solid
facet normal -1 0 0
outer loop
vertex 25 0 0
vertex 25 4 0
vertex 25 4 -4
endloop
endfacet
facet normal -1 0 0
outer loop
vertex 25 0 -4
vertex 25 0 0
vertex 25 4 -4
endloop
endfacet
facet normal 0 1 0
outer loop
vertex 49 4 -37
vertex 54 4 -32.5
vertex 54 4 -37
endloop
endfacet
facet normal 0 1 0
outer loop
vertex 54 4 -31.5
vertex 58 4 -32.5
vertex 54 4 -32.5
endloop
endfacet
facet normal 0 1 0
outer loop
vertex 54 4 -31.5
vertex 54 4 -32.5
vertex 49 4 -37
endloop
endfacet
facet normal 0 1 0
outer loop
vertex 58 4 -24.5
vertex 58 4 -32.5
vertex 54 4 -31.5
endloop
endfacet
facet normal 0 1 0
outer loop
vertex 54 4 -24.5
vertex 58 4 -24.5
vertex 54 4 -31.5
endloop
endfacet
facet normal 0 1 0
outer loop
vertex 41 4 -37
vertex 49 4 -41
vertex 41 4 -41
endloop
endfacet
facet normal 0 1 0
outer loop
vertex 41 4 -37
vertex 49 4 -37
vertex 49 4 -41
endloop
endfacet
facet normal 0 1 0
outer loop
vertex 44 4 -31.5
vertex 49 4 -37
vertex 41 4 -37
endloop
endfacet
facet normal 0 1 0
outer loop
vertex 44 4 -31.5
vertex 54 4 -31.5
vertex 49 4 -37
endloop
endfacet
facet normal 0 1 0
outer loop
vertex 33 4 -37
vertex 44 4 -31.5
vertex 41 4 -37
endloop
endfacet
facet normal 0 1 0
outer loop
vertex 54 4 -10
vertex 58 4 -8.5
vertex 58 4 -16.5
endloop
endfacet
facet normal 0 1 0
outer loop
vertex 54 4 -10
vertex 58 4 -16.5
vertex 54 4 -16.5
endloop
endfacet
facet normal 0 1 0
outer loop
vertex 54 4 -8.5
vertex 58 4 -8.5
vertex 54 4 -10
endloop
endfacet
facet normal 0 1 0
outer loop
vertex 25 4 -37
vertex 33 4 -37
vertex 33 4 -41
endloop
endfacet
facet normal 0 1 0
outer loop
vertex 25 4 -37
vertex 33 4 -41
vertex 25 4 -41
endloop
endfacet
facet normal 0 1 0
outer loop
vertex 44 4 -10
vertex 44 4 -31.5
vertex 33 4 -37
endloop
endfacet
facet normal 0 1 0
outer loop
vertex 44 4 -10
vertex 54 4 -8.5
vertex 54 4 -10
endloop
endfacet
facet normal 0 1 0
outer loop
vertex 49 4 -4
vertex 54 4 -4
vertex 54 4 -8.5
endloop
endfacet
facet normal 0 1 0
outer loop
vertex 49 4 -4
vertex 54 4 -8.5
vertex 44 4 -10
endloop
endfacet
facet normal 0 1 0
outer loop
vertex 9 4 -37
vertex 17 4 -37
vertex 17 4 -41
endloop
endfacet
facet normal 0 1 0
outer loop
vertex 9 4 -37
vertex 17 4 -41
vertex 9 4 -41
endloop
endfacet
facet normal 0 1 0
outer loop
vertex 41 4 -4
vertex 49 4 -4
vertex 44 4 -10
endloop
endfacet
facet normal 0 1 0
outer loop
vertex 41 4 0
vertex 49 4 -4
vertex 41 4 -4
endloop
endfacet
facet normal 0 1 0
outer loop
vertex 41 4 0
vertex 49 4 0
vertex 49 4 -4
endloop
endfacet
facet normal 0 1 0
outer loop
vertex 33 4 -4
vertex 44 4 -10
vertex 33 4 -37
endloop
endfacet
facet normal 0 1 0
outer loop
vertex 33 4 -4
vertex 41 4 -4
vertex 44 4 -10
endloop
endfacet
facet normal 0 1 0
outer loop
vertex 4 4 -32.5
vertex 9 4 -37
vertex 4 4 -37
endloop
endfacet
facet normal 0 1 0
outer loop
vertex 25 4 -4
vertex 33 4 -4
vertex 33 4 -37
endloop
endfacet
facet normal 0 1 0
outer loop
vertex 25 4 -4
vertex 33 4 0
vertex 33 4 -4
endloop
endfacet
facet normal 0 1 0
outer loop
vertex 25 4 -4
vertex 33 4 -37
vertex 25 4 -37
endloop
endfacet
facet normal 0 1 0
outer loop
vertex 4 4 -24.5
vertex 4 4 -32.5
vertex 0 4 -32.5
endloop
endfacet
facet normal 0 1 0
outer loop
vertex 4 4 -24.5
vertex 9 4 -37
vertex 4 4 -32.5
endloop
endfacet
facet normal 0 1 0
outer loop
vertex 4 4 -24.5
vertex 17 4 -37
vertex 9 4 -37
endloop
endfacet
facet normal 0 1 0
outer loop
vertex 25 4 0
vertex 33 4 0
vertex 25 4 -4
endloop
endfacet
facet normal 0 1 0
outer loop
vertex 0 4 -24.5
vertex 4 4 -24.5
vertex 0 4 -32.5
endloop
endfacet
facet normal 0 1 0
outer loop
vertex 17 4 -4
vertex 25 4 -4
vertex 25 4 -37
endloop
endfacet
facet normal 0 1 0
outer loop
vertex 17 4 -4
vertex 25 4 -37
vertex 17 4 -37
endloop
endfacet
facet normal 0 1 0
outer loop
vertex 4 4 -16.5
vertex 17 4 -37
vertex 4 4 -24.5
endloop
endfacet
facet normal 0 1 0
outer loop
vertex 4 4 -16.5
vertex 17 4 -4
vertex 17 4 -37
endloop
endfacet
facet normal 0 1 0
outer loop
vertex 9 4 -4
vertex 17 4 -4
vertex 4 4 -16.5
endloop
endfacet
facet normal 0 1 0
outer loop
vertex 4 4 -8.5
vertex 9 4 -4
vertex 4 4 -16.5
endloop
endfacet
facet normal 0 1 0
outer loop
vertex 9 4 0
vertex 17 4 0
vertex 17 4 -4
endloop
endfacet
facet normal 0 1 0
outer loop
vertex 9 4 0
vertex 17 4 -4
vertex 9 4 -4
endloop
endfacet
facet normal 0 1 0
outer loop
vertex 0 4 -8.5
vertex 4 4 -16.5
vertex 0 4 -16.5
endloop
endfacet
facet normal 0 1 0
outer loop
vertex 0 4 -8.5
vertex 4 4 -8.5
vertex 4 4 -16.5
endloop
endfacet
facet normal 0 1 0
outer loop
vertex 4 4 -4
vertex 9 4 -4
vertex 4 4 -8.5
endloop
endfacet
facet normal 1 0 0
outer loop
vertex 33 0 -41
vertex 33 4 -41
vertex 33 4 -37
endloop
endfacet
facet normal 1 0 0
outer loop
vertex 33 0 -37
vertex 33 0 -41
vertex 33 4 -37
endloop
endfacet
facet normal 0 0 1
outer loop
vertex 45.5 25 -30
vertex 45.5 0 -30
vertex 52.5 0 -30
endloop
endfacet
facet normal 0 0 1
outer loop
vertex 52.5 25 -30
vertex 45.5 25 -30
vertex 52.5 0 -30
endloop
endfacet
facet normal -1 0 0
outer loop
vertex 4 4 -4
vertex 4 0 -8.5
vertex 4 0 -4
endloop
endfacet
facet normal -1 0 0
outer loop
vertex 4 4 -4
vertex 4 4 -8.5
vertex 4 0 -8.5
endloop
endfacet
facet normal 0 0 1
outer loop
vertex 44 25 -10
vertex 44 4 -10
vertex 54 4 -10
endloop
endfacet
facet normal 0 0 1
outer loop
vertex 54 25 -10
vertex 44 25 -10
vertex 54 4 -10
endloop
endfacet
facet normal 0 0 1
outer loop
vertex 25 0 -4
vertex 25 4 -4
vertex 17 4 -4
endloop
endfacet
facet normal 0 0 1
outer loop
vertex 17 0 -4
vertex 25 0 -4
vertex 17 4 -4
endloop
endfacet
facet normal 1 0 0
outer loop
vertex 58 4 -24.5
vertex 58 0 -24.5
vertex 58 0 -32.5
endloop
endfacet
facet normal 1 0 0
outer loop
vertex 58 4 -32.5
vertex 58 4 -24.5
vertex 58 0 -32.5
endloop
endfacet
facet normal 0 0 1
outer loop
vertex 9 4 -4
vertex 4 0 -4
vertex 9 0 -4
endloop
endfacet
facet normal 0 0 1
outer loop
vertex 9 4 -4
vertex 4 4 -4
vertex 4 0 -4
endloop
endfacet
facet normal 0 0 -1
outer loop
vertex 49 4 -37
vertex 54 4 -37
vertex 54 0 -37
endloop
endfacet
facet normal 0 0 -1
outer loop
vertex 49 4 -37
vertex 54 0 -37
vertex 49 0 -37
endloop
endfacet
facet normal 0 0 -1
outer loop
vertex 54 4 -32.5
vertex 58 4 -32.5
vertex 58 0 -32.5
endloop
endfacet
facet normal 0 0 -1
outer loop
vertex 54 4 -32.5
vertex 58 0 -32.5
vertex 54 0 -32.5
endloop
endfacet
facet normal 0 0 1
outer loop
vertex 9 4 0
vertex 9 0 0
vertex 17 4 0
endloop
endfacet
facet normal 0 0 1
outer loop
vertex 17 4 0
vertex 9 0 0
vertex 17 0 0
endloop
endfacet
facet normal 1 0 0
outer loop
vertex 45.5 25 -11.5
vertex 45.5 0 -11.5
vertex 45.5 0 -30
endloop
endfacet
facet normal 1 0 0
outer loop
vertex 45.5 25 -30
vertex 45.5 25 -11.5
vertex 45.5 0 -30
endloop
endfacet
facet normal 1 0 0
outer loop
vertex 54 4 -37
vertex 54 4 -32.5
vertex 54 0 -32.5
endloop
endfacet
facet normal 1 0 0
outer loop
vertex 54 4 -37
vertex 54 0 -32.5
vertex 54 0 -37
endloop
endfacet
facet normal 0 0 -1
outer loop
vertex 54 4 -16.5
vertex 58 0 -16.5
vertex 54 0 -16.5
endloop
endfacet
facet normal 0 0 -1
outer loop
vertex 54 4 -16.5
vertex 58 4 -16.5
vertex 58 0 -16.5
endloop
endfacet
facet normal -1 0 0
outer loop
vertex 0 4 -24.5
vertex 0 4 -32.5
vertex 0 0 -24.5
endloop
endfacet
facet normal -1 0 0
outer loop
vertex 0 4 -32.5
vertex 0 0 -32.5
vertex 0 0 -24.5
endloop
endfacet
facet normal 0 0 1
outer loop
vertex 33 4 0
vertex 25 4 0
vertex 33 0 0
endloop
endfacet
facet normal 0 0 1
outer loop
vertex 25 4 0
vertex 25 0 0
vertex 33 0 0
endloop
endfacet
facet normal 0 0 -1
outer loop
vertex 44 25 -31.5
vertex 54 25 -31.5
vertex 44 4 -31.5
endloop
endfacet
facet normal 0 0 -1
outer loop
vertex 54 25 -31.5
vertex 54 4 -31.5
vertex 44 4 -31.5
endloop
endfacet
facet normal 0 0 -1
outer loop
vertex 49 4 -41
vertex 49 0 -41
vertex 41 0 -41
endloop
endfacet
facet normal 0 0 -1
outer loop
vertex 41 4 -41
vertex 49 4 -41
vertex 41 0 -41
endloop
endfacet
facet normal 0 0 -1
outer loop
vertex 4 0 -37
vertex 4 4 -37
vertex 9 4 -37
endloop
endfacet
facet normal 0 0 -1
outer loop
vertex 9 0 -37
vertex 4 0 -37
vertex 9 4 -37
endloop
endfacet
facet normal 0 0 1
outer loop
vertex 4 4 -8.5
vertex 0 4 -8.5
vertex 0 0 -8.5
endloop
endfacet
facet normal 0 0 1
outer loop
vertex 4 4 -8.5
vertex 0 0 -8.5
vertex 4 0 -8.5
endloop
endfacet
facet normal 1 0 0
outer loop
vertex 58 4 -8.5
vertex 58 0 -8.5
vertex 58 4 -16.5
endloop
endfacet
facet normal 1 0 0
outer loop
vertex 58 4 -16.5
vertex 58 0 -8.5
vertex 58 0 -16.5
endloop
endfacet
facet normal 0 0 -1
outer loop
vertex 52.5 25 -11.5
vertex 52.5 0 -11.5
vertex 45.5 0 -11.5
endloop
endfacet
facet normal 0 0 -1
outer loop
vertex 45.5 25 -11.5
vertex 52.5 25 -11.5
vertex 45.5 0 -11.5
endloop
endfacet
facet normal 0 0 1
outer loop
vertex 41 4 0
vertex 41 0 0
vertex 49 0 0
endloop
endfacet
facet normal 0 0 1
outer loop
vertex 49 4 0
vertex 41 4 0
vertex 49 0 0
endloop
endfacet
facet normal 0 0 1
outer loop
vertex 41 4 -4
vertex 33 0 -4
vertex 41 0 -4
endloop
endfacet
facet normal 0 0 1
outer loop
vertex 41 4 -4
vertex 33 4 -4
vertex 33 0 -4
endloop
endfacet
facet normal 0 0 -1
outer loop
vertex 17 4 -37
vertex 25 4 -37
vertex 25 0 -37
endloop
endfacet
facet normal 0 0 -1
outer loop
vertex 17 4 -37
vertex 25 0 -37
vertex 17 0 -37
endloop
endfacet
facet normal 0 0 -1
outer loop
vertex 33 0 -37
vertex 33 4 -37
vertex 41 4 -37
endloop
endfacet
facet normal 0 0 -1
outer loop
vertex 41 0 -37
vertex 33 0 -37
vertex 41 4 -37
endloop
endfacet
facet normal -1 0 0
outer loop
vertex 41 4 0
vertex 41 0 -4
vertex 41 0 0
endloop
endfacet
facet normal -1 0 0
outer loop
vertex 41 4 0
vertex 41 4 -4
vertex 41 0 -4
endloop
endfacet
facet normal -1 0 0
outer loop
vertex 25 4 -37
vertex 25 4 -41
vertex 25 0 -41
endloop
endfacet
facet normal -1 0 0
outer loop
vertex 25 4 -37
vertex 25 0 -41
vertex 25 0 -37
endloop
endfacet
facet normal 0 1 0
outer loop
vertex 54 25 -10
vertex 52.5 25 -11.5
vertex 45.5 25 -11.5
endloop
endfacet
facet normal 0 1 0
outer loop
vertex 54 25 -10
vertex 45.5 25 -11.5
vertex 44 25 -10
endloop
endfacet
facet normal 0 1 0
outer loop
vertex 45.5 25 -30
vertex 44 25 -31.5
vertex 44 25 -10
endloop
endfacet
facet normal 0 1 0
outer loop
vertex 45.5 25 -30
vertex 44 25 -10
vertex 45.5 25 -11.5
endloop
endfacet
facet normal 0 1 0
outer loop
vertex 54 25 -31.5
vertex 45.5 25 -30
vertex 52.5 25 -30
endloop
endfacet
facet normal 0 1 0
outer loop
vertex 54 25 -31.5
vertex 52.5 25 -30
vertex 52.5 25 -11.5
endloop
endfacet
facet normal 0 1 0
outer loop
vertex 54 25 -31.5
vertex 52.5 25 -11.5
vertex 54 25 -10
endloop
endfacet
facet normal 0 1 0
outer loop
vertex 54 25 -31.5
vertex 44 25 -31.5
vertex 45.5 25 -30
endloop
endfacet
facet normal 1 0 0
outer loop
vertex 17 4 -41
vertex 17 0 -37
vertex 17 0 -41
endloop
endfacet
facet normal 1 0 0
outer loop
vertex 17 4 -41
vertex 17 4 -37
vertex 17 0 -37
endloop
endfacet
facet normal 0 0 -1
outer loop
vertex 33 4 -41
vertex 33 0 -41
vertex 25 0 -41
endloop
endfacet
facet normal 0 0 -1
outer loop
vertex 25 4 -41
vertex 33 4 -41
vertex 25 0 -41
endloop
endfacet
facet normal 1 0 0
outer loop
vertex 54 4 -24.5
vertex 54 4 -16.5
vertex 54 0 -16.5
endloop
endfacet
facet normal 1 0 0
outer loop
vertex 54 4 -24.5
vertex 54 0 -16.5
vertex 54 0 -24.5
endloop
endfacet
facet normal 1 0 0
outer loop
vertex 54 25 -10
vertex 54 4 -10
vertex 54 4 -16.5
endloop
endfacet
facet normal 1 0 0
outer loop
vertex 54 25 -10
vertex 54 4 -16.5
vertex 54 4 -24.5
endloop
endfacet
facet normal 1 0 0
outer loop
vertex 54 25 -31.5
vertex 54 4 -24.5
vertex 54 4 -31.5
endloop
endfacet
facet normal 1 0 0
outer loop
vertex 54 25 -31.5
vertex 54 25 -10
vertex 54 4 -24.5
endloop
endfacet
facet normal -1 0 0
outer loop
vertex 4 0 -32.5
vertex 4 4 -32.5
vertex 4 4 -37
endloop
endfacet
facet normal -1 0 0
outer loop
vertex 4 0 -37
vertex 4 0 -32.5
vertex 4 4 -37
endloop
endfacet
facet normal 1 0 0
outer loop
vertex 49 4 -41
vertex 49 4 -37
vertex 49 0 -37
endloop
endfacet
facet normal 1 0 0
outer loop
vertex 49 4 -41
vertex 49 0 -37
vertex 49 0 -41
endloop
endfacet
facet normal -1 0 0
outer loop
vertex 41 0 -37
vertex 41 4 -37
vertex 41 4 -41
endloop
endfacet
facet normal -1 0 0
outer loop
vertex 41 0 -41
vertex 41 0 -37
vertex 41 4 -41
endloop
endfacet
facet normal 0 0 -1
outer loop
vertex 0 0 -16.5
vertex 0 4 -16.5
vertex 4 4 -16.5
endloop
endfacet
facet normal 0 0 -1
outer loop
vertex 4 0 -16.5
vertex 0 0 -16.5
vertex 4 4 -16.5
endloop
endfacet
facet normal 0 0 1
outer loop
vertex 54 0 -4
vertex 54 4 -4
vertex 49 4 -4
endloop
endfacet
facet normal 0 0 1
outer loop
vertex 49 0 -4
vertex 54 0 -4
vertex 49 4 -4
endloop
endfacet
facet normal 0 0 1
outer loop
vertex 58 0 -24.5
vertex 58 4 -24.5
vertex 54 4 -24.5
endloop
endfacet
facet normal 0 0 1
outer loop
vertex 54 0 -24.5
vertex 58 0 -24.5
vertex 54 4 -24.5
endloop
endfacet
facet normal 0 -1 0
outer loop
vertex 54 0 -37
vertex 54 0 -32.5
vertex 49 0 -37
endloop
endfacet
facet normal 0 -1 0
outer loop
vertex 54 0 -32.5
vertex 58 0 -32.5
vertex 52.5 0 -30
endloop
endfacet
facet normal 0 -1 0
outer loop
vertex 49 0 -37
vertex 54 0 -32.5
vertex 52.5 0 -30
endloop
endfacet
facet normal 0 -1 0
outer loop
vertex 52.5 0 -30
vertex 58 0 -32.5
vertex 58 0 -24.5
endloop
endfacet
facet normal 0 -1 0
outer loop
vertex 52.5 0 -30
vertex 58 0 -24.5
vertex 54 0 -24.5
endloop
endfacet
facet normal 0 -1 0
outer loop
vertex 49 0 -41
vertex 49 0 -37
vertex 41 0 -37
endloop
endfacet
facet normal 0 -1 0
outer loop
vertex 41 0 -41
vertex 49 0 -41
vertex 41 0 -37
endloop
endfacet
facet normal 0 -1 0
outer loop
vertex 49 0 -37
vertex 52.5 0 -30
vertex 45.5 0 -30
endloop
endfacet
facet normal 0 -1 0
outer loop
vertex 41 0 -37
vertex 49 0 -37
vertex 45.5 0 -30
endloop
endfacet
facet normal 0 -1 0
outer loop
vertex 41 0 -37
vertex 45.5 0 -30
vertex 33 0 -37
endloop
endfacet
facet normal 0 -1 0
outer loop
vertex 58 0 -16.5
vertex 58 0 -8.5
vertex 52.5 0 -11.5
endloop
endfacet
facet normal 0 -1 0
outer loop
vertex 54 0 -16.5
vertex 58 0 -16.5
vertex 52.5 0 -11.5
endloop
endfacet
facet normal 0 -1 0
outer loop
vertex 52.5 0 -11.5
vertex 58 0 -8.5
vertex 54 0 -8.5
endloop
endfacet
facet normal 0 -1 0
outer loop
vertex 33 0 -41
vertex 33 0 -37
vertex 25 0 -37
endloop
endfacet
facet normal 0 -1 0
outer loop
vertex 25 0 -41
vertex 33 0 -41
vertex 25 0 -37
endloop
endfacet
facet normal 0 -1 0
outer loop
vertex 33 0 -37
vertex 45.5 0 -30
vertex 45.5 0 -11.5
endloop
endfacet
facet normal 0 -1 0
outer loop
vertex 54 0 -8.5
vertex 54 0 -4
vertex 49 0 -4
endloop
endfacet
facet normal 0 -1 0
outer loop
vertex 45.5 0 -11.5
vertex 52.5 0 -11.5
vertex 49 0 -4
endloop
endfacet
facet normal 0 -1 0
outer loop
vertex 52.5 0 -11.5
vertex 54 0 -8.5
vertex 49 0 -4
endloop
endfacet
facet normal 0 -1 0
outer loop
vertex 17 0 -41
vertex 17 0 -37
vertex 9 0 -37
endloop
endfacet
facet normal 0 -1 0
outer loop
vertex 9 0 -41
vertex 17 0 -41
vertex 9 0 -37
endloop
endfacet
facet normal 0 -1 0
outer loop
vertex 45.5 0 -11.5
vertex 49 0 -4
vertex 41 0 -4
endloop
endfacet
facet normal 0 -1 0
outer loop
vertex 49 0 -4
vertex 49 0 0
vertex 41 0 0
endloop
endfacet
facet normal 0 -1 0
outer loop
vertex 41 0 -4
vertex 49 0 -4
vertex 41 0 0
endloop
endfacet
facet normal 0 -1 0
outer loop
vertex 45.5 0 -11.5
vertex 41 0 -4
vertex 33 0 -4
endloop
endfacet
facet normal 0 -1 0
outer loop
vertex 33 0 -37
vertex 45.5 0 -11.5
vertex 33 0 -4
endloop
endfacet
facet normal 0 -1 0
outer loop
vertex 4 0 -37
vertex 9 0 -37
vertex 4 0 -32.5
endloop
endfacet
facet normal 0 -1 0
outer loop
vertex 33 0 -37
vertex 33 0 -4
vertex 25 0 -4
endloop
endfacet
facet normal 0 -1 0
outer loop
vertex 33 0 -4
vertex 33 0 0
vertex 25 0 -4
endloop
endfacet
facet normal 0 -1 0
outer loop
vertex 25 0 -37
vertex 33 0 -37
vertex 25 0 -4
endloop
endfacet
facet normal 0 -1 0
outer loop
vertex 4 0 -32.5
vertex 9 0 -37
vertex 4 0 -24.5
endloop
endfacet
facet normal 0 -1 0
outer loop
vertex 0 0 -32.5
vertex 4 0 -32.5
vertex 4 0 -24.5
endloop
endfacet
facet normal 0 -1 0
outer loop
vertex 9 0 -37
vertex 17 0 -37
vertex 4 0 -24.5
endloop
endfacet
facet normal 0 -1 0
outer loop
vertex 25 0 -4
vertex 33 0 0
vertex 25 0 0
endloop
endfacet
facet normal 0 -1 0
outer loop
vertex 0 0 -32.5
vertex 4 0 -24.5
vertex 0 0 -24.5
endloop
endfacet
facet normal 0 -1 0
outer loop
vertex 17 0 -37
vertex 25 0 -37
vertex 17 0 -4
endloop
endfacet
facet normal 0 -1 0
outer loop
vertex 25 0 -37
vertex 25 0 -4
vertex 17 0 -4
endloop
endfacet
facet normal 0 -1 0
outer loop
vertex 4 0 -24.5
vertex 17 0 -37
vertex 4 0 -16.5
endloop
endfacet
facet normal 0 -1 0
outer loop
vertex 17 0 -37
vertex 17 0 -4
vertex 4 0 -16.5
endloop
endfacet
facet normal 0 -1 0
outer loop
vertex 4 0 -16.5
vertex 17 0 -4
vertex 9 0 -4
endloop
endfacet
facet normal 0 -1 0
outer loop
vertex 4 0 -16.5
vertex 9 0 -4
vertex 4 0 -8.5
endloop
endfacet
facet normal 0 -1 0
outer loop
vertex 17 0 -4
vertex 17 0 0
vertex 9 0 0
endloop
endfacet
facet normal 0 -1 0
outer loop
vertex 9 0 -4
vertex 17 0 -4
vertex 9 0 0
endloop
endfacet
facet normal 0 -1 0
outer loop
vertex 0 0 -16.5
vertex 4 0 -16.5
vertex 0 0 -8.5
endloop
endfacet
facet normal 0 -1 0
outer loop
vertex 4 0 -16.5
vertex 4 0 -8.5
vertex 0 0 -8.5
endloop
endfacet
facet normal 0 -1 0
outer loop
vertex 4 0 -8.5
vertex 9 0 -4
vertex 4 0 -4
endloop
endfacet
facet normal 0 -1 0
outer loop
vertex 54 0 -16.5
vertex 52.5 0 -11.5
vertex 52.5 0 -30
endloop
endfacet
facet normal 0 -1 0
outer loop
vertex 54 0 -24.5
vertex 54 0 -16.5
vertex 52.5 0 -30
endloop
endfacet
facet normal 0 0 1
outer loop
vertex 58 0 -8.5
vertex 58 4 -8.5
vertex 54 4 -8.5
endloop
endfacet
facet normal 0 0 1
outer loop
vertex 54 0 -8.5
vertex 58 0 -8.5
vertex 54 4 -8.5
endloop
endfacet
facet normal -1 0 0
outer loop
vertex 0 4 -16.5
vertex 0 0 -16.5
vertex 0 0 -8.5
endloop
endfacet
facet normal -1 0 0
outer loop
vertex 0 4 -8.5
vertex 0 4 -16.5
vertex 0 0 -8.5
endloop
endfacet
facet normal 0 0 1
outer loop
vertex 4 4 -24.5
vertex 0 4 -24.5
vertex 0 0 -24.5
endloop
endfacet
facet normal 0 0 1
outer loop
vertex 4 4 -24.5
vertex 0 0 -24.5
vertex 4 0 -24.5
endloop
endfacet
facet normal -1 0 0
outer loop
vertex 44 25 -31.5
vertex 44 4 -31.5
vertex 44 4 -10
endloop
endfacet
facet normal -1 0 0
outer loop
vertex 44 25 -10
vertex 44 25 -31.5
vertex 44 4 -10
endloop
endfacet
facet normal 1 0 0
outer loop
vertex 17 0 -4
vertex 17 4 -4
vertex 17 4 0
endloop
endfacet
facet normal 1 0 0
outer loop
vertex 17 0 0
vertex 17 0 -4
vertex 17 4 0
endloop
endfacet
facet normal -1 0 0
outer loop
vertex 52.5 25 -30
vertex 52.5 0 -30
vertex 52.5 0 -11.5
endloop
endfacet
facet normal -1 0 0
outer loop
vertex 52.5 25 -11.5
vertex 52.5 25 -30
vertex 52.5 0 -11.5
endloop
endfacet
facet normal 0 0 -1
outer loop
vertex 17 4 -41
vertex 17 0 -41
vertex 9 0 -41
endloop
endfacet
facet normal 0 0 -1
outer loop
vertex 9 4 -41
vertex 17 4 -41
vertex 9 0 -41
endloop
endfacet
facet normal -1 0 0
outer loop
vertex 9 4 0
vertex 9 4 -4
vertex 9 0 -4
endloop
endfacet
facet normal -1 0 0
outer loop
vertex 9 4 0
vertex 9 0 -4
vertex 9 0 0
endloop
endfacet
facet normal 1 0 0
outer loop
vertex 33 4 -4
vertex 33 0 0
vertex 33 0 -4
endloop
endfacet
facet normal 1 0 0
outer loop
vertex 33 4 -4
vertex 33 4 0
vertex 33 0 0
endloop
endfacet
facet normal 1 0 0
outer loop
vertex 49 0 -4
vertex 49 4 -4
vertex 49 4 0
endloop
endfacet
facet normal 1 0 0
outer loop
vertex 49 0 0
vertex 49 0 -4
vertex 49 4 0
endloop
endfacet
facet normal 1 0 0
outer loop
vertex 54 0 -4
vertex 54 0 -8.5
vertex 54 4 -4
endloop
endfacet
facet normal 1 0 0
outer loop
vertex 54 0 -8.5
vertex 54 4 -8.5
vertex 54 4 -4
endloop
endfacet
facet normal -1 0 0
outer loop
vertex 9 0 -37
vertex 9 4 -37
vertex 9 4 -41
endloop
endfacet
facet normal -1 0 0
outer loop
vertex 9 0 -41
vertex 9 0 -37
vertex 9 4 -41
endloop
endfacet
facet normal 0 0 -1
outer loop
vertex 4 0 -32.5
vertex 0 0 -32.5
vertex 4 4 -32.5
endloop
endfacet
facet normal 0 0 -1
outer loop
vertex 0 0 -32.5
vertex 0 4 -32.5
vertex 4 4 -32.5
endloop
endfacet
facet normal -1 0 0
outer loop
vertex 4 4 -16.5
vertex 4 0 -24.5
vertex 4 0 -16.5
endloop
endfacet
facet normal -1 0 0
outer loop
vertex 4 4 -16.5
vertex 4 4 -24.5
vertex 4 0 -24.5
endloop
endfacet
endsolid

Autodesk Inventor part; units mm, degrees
ref_plane "YZ Plane" through (0, 0, 0) normal (1, 0, 0) x (0, 1, 0)
ref_plane "XZ Plane" through (0, 0, 0) normal (0, 1, 0) x (-1, 0, 0)
ref_plane "XY Plane" through (0, 0, 0) normal (0, 0, 1) x (1, 0, 0)
sketch "Sketch1" plane through (0, 0, 0) normal (0, 1, 0) x (-1, 0, 0)
  line L0 (0, 0) -> (-58, 0)
  line L1 (-58, 0) -> (-58, -41)
  line L2 (-58, -41) -> (0, -41)
  line L3 (0, -41) -> (0, 0)
  line L4 (-45.5, -30) -> (-52.5, -30)
  line L5 (-52.5, -30) -> (-52.5, -11.5)
  line L6 (-52.5, -11.5) -> (-45.5, -11.5)
  line L7 (-45.5, -11.5) -> (-45.5, -30)
  dimension "d0" = 58
  dimension "d1" = 41
  dimension "d2" = 11.5
  dimension "d3" = 11
  dimension "d4" = 7
  dimension "d5" = 5.5
extrude "Extrusion1" add sketch "Sketch1" along normal blind 4
sketch "Sketch2" plane through (0, 4, 0) normal (0, 1, 0) x (1, 0, 0)
  line L0 (45.5, 11.5) -> (45.5, 30) projected
  line L1 (45.5, 30) -> (52.5, 30) projected
  line L2 (52.5, 30) -> (52.5, 11.5) projected
  line L3 (52.5, 11.5) -> (45.5, 11.5) projected
  line L4 (54, 31.5) -> (44, 31.5)
  line L5 (44, 31.5) -> (44, 10)
  line L6 (44, 10) -> (54, 10)
  line L7 (54, 10) -> (54, 31.5)
  point P0 (0, 0)
  dimension "d8" = 1.5
extrude "Extrusion2" add sketch "Sketch2" along normal blind 21
sketch "Sketch3" plane through (0, 4, 0) normal (0, 1, 0) x (1, 0, 0)
  line L0 (58, 41) -> (0, 41) construction
  line L1 (0, 41) -> (0, 0) construction
  line L2 (0, 0) -> (58, 0) construction
  line L3 (58, 0) -> (58, 41) construction
  line L4 (4, 37) -> (54, 37) construction
  line L5 (54, 37) -> (54, 4) construction
  line L6 (54, 4) -> (4, 4) construction
  line L7 (4, 4) -> (4, 37) construction
  line L8 (0, 20.5) -> (58, 20.5) construction
  line L9 (29, 0) -> (29, 41) construction
  line L10 (0, 16.5) -> (4, 16.5)
  line L11 (4, 16.5) -> (4, 20.5)
  line L12 (0, 16.5) -> (0, 20.5)
  line L13 (0, 8.5) -> (4, 8.5)
  line L14 (4, 8.5) -> (4, 4)
  line L15 (4, 4) -> (9, 4)
  line L16 (9, 4) -> (9, 0)
  line L17 (9, 0) -> (0, 0)
  line L18 (0, 0) -> (0, 8.5)
  line L19 (17, 4) -> (17, 0)
  line L20 (17, 0) -> (25, 0)
  line L21 (25, 0) -> (25, 4)
  line L22 (25, 4) -> (17, 4)
  line L23 (0, 24.5) -> (4, 24.5)
  line L24 (4, 24.5) -> (4, 20.5)
  line L25 (0, 24.5) -> (0, 20.5)
  line L26 (0, 32.5) -> (4, 32.5)
  line L27 (4, 32.5) -> (4, 37)
  line L28 (4, 37) -> (9, 37)
  line L29 (9, 37) -> (9, 41)
  line L30 (9, 41) -> (0, 41)
  line L31 (0, 41) -> (0, 32.5)
  line L32 (17, 37) -> (17, 41)
  line L33 (17, 41) -> (25, 41)
  line L34 (25, 41) -> (25, 37)
  line L35 (25, 37) -> (17, 37)
  line L36 (58, 41) -> (58, 0) construction
  line L37 (54, 4) -> (54, 37) construction
  line L38 (58, 16.5) -> (54, 16.5)
  line L39 (54, 16.5) -> (54, 20.5)
  line L40 (58, 16.5) -> (58, 20.5)
  line L41 (58, 8.5) -> (54, 8.5)
  line L42 (54, 8.5) -> (54, 4)
  line L43 (54, 4) -> (49, 4)
  line L44 (49, 4) -> (49, 0)
  line L45 (49, 0) -> (58, 0)
  line L46 (58, 0) -> (58, 8.5)
  line L47 (41, 4) -> (41, 0)
  line L48 (41, 0) -> (33, 0)
  line L49 (33, 0) -> (33, 4)
  line L50 (33, 4) -> (41, 4)
  line L51 (49, 37) -> (49, 41)
  line L52 (54, 24.5) -> (54, 20.5)
  line L53 (54, 32.5) -> (54, 37)
  line L54 (54, 37) -> (49, 37)
  line L55 (58, 24.5) -> (58, 20.5)
  line L56 (58, 24.5) -> (54, 24.5)
  line L57 (58, 32.5) -> (54, 32.5)
  line L58 (58, 41) -> (58, 32.5)
  line L59 (49, 41) -> (58, 41)
  line L60 (41, 37) -> (41, 41)
  line L61 (33, 37) -> (41, 37)
  line L62 (41, 41) -> (33, 41)
  line L63 (33, 41) -> (33, 37)
  dimension "d11" = 4
  dimension "d12" = 4
  dimension "d13" = 8
  dimension "d14" = 8
  dimension "d15" = 4
  dimension "d16" = 8
extrude "Extrusion3" cut sketch "Sketch3" against normal up to surface (4 mm away)
properties part number "top" material "PBT Plastic Black"
